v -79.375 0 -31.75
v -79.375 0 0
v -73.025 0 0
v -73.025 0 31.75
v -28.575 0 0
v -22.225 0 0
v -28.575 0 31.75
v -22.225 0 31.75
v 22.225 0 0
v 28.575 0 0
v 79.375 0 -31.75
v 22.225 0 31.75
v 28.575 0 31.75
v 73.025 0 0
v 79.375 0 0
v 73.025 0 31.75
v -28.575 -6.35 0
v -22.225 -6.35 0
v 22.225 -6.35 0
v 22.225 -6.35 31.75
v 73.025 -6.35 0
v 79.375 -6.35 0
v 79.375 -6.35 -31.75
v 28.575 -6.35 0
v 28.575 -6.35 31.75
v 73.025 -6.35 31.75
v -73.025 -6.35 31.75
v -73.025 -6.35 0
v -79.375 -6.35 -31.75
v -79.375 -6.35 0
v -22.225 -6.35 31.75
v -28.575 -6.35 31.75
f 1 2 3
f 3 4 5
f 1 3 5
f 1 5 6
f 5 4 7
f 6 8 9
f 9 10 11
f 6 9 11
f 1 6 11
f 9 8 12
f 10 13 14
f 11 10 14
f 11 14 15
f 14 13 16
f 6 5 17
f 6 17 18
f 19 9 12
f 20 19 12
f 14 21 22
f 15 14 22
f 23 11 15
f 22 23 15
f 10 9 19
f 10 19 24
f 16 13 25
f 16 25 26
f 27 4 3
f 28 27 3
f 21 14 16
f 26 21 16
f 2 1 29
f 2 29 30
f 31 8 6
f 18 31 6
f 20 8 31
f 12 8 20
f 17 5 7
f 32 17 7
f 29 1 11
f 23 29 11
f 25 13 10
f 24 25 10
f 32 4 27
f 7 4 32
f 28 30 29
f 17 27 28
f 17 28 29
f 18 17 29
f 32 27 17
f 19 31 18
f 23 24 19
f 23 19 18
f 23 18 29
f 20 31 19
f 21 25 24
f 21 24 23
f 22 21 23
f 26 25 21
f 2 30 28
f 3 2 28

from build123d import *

# Parameters (mm, degrees)
F0_W     = 44.45
F0_H     = 31.75
F0_W_2   = 6.35
F1_DEPTH = 6.35


with BuildPart() as f1:
    # F0 (on Front) → F1 (new body)
    with BuildSketch(Plane.XZ):
        with Locations((-50.8, 15.875)):
            Rectangle(F0_W, F0_H)
        with Locations((0, 15.875)):
            Rectangle(F0_W, F0_H)
        with Locations((50.8, 15.875)):
            Rectangle(F0_W, F0_H)
        with Locations((-50.8, -15.875)):
            Rectangle(F0_W, F0_H)
        with Locations((0, -15.875)):
            Rectangle(F0_W, F0_H)
        with Locations((50.8, -15.875)):
            Rectangle(F0_W, F0_H)
        with Locations((-76.2, -15.875)):
            Rectangle(F0_W_2, F0_H)
        with Locations((-25.4, -15.875)):
            Rectangle(F0_W_2, F0_H)
        with Locations((25.4, -15.875)):
            Rectangle(F0_W_2, F0_H)
        with Locations((76.2, -15.875)):
            Rectangle(F0_W_2, F0_H)
    extrude(amount=F1_DEPTH)


solid = f1.part
